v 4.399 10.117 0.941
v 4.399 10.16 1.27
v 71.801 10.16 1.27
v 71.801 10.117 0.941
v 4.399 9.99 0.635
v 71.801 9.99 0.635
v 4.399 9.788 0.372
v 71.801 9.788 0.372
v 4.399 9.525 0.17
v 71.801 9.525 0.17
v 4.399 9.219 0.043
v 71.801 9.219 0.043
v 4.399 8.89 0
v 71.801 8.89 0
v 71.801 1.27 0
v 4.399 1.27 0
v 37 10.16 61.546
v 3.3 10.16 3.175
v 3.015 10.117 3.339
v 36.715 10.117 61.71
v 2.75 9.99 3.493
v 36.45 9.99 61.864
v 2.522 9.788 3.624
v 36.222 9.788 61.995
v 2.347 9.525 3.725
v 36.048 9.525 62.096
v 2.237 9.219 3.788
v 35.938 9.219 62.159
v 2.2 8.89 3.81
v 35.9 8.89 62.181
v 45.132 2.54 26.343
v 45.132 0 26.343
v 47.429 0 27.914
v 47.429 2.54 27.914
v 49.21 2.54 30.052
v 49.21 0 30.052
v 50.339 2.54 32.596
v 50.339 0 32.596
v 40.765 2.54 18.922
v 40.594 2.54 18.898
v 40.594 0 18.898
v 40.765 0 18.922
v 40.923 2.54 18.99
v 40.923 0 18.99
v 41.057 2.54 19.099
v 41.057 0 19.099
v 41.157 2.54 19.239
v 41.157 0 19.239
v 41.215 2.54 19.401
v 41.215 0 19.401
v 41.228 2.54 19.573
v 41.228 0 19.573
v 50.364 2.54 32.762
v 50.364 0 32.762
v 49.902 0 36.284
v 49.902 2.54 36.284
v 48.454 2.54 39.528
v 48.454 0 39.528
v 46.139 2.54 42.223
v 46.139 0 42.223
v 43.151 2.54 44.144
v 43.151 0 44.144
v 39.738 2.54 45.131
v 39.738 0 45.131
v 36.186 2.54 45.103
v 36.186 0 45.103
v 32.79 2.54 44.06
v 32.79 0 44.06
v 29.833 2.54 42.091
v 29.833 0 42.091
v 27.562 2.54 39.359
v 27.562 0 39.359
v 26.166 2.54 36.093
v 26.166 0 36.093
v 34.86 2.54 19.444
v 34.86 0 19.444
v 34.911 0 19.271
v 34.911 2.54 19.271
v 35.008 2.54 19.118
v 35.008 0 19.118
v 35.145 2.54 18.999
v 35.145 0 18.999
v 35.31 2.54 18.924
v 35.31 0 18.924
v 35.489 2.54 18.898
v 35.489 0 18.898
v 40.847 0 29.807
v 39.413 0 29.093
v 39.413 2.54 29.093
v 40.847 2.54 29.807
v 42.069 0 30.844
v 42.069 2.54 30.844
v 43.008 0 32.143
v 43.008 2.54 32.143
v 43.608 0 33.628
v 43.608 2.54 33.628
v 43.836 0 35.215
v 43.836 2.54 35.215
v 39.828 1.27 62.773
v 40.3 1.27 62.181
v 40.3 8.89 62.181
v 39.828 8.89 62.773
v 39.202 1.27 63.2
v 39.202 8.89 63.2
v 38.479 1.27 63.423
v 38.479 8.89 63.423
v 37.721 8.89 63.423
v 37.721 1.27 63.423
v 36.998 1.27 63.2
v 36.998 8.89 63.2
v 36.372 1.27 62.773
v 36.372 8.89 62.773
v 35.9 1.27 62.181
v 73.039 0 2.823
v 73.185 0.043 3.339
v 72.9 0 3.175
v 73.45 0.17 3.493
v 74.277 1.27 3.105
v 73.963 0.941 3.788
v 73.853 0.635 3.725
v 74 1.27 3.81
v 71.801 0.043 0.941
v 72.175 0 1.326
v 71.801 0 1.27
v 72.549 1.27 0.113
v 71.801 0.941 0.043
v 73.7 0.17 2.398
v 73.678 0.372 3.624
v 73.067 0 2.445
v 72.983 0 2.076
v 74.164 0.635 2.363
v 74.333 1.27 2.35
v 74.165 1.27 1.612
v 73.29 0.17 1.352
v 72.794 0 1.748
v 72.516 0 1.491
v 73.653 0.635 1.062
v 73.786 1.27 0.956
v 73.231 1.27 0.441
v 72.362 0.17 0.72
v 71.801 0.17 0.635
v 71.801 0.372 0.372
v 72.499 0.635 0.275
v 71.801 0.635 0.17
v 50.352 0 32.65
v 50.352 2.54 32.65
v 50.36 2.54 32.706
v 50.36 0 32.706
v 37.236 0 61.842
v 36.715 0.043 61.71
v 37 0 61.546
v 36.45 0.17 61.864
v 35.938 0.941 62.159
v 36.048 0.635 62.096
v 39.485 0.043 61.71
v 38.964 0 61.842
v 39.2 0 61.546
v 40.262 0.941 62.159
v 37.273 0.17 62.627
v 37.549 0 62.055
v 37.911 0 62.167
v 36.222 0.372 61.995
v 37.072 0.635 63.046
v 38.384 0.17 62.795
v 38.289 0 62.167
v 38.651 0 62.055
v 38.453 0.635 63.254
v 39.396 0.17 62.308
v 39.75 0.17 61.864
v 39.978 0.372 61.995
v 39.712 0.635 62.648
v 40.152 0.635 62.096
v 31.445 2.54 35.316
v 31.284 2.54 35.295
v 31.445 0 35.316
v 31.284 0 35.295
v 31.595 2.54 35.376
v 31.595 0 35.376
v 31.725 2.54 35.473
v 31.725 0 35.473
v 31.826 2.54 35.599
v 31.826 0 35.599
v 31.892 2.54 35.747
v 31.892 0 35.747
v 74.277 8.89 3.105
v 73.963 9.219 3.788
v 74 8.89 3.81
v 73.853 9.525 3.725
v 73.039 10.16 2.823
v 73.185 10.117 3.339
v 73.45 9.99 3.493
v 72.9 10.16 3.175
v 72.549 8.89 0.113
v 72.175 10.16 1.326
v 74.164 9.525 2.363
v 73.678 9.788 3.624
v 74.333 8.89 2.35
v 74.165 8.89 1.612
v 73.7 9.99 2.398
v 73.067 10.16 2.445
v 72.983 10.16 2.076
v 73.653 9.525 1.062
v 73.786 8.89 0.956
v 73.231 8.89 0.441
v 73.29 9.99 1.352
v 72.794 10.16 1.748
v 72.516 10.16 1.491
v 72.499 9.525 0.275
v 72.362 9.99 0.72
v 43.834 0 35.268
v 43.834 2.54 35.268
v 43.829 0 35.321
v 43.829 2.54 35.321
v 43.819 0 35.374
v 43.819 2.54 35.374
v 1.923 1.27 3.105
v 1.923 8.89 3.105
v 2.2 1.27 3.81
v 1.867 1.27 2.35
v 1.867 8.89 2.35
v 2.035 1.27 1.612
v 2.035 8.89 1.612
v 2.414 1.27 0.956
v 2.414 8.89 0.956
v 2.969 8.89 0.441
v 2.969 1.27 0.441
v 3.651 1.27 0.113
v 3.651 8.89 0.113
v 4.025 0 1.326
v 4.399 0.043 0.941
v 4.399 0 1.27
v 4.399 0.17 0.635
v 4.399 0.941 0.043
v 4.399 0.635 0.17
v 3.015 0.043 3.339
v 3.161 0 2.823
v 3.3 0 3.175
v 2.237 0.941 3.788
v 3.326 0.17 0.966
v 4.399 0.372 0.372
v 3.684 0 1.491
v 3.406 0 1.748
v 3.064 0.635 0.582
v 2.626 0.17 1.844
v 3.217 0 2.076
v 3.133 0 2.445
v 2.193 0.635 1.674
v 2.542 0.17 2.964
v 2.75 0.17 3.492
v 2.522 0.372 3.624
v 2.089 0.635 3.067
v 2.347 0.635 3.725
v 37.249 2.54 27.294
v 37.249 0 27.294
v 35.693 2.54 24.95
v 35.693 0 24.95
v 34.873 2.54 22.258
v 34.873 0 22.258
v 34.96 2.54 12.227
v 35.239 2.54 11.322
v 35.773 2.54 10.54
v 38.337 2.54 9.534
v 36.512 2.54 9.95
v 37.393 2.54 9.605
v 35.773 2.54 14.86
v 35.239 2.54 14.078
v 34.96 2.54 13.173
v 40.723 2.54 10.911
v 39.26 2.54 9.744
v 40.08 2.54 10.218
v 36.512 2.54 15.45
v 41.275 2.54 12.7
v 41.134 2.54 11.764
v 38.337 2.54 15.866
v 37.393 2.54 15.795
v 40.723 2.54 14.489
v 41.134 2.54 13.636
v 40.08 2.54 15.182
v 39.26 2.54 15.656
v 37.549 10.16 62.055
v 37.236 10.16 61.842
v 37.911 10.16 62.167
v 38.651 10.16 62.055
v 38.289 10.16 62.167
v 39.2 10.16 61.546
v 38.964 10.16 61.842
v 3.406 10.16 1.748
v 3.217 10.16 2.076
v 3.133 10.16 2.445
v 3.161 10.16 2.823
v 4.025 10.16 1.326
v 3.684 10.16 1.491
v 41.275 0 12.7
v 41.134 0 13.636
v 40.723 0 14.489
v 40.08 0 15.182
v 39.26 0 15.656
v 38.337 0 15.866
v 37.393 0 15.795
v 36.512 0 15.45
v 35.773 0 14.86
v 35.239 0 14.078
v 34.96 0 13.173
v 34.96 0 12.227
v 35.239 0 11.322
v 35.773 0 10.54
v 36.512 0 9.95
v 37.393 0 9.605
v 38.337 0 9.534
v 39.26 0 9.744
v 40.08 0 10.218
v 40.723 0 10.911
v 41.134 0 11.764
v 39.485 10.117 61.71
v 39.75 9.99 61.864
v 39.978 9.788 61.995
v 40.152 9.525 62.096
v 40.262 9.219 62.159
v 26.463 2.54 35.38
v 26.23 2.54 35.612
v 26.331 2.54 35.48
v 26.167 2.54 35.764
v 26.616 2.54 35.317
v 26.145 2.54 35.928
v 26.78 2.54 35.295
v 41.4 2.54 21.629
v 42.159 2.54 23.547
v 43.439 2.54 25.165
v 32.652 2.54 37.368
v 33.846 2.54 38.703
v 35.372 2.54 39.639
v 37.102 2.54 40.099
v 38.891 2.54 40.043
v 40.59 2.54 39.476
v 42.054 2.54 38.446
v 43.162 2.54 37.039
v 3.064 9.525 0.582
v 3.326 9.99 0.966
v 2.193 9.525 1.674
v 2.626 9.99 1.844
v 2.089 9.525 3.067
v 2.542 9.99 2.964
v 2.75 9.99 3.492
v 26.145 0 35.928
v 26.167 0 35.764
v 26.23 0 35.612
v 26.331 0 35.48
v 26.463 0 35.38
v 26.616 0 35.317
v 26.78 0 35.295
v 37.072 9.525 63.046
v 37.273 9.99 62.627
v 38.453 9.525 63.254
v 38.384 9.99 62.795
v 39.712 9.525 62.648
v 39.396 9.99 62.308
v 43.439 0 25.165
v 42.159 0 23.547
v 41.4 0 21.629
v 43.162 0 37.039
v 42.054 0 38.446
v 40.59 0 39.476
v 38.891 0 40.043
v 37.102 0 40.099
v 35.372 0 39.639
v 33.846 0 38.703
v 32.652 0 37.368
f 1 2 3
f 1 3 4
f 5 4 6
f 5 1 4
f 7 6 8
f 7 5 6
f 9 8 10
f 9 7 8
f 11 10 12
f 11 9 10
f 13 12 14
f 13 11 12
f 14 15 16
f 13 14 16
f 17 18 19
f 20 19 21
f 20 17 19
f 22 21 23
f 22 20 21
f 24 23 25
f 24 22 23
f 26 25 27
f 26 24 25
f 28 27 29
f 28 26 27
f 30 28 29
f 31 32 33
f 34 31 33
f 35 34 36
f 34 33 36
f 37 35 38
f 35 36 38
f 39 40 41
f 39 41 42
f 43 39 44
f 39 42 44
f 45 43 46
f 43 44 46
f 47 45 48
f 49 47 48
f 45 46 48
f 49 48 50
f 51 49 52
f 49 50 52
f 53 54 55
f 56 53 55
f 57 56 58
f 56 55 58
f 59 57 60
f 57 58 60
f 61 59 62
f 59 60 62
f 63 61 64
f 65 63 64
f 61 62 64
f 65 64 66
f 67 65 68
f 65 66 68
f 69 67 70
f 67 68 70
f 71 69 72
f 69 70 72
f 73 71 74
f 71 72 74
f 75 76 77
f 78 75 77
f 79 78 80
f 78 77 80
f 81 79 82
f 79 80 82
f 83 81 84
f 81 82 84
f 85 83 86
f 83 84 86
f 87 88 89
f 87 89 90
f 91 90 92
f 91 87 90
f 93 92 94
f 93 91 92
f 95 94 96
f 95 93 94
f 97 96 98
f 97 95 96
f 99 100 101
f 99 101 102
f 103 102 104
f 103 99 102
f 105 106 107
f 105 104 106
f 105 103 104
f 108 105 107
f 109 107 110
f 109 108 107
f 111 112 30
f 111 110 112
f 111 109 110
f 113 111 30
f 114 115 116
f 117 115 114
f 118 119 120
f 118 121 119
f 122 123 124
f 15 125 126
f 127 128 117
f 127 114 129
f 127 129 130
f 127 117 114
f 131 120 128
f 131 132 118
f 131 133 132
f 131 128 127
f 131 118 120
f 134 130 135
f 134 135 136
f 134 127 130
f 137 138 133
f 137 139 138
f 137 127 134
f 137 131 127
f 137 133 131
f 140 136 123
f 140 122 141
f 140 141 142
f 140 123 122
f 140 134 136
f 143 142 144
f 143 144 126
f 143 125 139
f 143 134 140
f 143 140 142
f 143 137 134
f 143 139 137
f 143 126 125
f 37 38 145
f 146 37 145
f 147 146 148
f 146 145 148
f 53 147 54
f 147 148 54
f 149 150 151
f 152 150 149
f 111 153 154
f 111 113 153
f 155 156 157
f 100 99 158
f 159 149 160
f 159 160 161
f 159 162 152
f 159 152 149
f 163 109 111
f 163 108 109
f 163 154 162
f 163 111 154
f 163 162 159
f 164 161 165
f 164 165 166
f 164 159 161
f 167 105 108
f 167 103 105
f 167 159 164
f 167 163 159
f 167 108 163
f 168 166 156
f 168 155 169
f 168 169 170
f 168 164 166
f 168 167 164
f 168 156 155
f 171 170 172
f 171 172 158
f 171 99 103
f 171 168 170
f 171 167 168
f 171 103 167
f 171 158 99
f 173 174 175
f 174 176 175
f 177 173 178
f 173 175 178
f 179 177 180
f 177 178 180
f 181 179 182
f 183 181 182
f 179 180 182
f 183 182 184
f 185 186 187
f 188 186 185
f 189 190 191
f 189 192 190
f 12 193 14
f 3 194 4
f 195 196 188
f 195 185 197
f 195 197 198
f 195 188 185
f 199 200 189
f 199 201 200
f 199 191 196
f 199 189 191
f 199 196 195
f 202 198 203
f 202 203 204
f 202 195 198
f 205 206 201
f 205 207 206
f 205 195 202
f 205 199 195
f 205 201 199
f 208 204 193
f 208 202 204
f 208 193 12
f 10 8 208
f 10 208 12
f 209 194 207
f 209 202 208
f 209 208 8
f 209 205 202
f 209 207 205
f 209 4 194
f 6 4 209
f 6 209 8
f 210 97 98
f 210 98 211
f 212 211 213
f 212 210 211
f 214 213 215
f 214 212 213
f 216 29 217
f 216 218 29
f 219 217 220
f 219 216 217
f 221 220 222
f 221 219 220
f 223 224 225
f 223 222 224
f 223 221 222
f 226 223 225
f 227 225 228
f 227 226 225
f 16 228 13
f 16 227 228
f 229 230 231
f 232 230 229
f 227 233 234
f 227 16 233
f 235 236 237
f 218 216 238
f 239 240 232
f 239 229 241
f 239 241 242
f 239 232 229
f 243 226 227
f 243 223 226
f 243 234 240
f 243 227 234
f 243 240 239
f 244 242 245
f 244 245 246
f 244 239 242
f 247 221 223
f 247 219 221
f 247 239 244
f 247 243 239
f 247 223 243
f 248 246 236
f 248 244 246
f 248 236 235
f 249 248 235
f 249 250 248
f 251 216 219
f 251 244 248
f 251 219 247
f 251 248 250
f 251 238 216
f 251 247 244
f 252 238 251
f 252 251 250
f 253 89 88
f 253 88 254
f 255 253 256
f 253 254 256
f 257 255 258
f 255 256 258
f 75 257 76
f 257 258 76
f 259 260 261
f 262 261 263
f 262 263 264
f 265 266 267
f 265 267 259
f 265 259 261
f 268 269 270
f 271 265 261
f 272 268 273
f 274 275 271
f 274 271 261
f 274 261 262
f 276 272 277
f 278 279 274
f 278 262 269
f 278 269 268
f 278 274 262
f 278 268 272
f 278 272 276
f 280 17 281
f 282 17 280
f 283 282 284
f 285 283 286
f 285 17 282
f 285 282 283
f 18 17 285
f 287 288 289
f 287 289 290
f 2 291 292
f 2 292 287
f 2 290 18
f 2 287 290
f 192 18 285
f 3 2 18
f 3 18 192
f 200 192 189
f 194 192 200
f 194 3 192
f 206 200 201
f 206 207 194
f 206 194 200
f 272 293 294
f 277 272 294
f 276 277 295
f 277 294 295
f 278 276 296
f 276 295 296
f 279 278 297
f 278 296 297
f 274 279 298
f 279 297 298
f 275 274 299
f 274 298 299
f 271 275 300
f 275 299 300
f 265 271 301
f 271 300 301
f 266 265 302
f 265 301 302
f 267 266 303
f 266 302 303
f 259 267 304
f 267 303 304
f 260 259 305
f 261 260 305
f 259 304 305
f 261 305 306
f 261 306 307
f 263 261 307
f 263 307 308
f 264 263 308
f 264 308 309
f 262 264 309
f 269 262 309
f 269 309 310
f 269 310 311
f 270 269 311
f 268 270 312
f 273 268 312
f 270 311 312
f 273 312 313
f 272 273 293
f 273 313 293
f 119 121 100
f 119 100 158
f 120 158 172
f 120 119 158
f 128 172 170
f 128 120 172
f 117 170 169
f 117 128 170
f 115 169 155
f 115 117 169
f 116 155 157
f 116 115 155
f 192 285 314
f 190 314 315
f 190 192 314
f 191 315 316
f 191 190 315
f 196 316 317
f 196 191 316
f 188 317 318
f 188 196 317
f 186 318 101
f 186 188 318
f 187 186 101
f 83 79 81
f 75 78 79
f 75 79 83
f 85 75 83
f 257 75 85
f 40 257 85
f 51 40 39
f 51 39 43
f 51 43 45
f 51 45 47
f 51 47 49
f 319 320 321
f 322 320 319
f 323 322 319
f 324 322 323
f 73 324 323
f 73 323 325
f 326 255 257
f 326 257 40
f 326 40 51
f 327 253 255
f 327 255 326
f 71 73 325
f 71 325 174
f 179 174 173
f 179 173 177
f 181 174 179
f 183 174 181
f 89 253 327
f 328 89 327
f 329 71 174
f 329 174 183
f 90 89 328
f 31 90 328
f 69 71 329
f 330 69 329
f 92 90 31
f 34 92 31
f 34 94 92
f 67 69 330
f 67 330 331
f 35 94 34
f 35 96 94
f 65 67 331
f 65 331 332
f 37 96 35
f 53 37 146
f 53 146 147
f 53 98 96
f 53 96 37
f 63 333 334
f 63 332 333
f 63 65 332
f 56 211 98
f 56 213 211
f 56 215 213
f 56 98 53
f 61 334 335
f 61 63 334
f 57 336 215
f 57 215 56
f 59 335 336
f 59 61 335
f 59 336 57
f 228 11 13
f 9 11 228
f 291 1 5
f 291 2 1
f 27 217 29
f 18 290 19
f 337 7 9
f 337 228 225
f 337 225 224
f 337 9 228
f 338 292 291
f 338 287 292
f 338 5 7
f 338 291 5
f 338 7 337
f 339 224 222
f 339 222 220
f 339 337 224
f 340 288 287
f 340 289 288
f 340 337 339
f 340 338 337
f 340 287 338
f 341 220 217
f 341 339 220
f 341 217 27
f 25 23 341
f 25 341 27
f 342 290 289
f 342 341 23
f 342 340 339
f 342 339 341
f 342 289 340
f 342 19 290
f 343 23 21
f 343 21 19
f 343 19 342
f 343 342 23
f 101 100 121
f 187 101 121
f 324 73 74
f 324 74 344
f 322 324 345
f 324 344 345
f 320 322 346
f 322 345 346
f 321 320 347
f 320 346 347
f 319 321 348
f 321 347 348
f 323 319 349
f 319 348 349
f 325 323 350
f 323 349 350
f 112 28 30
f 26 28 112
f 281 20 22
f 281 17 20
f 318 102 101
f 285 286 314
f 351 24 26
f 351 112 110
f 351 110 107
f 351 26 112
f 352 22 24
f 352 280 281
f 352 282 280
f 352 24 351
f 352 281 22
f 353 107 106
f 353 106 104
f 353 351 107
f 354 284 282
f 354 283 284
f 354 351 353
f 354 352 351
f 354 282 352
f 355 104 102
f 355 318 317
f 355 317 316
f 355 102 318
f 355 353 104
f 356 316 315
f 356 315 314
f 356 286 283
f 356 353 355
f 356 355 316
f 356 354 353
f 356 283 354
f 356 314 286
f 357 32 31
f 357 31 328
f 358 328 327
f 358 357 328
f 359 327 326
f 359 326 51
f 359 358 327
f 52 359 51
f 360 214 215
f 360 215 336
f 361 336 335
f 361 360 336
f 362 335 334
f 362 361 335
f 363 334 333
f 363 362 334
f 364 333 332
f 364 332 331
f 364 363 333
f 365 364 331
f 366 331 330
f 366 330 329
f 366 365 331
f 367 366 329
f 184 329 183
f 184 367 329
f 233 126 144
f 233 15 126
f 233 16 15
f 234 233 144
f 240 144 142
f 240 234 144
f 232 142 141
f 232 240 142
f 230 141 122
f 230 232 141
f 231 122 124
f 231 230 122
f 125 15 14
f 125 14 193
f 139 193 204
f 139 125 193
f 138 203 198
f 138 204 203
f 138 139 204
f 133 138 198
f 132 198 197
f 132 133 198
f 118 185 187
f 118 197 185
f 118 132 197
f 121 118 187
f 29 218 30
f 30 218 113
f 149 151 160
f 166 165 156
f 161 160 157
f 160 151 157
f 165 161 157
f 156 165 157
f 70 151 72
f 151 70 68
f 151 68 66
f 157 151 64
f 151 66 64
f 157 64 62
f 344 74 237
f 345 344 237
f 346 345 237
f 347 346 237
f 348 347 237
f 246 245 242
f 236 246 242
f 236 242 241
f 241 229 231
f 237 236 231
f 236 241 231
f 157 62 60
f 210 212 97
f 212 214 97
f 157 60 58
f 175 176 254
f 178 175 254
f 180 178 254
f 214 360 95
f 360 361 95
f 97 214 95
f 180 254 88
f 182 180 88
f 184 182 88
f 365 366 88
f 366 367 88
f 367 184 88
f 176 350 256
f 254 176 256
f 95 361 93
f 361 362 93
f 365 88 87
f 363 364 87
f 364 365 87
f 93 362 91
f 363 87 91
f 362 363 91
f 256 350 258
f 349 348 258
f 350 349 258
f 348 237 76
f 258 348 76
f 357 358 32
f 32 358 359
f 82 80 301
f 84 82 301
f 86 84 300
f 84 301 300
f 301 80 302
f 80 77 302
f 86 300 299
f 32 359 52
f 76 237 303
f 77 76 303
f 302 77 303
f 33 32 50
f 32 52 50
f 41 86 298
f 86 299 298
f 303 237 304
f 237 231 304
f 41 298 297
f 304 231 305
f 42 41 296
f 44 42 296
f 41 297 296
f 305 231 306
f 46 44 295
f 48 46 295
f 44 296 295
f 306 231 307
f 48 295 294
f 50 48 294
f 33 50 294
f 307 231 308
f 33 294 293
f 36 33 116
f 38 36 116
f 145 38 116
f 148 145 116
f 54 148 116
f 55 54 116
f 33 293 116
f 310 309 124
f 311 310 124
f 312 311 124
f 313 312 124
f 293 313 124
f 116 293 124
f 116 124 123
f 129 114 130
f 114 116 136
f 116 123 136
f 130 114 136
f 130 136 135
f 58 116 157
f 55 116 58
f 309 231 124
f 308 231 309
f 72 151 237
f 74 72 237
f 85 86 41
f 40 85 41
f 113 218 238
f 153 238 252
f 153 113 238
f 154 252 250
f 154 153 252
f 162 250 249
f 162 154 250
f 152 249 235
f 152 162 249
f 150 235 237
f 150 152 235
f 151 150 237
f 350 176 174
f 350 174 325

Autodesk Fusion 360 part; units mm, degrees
sketch "Sketch1" plane through (0, 0, 0) normal (0, 1, 0) x (1, 0, 0)
  line L0 (2.1997, -3.81) -> (35.9003, -62.1811)
  line L1 (4.3994, 0) -> (71.8006, 0) construction
  line L2 (40.2997, -62.1811) -> (74.0003, -3.81)
  line L3 (76.2, 0) -> (0, 0)
  arc A0 (35.9003, -62.1811) -> (40.2997, -62.1811) centre (38.1, -60.9111) ccw
  arc A1 (74.0003, -3.81) -> (71.8006, 0) centre (71.8006, -2.54) ccw
  arc A2 (4.3994, 0) -> (2.1997, -3.81) centre (4.3994, -2.54) ccw
  point P0 (38.1, -65.9911)
  point P1 (76.2, 0)
  dimension "d1" = 60
  dimension "d2" = 76.2
  dimension "d4" = 76.2
  dimension "d7" = 2.54
  dimension "d8" = 2.54
extrude "Extrude1" add sketch "Sketch1" along normal blind 12.7
sketch "Sketch2" plane through (0, 0, 0) normal (0, -1, 0) x (1, 0, 0)
  arc A0 (2.1997, 3.81) -> (4.3994, 0) centre (4.3994, 2.54) ccw
  line L0 (4.3994, 0) -> (71.8006, 0)
  arc A1 (71.8006, 0) -> (74.0003, 3.81) centre (71.8006, 2.54) ccw
  line L1 (74.0003, 3.81) -> (40.2997, 62.1811)
  arc A2 (40.2997, 62.1811) -> (35.9003, 62.1811) centre (38.1, 60.9111) ccw
  line L2 (35.9003, 62.1811) -> (2.1997, 3.81)
  circle A3 centre (38.1, 12.7) radius 3.175
  line L3 (31.2844, 35.295) -> (26.7797, 35.295)
  arc A4 (43.8189, 35.3736) -> (31.8923, 35.7466) centre (37.8056, 33.9623) ccw
  arc A5 (50.3635, 32.7617) -> (26.1659, 36.0926) centre (38.0602, 32.9416) ccw
  arc A6 (39.4129, 29.0927) -> (43.8356, 35.2148) centre (37.1886, 35.3581) ccw
  arc A7 (45.1318, 26.343) -> (50.3389, 32.5958) centre (40.6355, 35.382) ccw
  arc A8 (39.4129, 29.0927) -> (34.8601, 19.4443) centre (44.4732, 20.8065) ccw
  arc A9 (45.1318, 26.343) -> (41.228, 19.5734) centre (48.2777, 20.0185) ccw
  line L4 (35.4888, 18.8984) -> (40.5943, 18.8984)
  arc A10 (26.1659, 36.0926) -> (26.7797, 35.295) centre (26.7797, 35.93) ccw
  arc A11 (31.2844, 35.295) -> (31.8923, 35.7466) centre (31.2844, 35.93) ccw
  arc A12 (34.8601, 19.4443) -> (35.4888, 18.8984) centre (35.4888, 19.5334) ccw
  arc A13 (40.5943, 18.8984) -> (41.228, 19.5734) centre (40.5943, 19.5334) ccw
  arc A14 (43.8356, 35.2148) -> (43.8189, 35.3736) centre (43.2007, 35.2285) ccw
  arc A15 (50.3389, 32.5958) -> (50.3635, 32.7617) centre (49.7286, 32.771) ccw
  point P0 (34.9534, 18.8984)
  point P1 (41.3034, 18.8984)
  dimension "d9" = 6.35
  dimension "d11" = 6.35
  dimension "d12" = 0.635
extrude "Extrude2" cut 1 faces at (38.8332, 12.7, 20.727) along direction (0, -1, 0) blind 2.54
extrude "Extrude3" cut sketch "Sketch2" against normal blind 2.54 contours A3 | L3 A4 A5 A6 A7 A8 A9 L4 A10 A11 A12 A13 A14 A15
fillet "Fillet1" radius 1.27 6 edges at (38.1, 0, 0) (2.1997, 0, 1.27) (19.05, 0, 32.9956) (38.1, 0, 63.4511) (57.15, 0, 32.9956) (74.0003, 0, 1.27)
fillet "Fillet2" radius 1.27 6 edges at (19.05, 10.16, 32.9956) (2.1997, 10.16, 1.27) (38.1, 10.16, 0) (74.0003, 10.16, 1.27) (57.15, 10.16, 32.9956) (38.1, 10.16, 63.4511)
